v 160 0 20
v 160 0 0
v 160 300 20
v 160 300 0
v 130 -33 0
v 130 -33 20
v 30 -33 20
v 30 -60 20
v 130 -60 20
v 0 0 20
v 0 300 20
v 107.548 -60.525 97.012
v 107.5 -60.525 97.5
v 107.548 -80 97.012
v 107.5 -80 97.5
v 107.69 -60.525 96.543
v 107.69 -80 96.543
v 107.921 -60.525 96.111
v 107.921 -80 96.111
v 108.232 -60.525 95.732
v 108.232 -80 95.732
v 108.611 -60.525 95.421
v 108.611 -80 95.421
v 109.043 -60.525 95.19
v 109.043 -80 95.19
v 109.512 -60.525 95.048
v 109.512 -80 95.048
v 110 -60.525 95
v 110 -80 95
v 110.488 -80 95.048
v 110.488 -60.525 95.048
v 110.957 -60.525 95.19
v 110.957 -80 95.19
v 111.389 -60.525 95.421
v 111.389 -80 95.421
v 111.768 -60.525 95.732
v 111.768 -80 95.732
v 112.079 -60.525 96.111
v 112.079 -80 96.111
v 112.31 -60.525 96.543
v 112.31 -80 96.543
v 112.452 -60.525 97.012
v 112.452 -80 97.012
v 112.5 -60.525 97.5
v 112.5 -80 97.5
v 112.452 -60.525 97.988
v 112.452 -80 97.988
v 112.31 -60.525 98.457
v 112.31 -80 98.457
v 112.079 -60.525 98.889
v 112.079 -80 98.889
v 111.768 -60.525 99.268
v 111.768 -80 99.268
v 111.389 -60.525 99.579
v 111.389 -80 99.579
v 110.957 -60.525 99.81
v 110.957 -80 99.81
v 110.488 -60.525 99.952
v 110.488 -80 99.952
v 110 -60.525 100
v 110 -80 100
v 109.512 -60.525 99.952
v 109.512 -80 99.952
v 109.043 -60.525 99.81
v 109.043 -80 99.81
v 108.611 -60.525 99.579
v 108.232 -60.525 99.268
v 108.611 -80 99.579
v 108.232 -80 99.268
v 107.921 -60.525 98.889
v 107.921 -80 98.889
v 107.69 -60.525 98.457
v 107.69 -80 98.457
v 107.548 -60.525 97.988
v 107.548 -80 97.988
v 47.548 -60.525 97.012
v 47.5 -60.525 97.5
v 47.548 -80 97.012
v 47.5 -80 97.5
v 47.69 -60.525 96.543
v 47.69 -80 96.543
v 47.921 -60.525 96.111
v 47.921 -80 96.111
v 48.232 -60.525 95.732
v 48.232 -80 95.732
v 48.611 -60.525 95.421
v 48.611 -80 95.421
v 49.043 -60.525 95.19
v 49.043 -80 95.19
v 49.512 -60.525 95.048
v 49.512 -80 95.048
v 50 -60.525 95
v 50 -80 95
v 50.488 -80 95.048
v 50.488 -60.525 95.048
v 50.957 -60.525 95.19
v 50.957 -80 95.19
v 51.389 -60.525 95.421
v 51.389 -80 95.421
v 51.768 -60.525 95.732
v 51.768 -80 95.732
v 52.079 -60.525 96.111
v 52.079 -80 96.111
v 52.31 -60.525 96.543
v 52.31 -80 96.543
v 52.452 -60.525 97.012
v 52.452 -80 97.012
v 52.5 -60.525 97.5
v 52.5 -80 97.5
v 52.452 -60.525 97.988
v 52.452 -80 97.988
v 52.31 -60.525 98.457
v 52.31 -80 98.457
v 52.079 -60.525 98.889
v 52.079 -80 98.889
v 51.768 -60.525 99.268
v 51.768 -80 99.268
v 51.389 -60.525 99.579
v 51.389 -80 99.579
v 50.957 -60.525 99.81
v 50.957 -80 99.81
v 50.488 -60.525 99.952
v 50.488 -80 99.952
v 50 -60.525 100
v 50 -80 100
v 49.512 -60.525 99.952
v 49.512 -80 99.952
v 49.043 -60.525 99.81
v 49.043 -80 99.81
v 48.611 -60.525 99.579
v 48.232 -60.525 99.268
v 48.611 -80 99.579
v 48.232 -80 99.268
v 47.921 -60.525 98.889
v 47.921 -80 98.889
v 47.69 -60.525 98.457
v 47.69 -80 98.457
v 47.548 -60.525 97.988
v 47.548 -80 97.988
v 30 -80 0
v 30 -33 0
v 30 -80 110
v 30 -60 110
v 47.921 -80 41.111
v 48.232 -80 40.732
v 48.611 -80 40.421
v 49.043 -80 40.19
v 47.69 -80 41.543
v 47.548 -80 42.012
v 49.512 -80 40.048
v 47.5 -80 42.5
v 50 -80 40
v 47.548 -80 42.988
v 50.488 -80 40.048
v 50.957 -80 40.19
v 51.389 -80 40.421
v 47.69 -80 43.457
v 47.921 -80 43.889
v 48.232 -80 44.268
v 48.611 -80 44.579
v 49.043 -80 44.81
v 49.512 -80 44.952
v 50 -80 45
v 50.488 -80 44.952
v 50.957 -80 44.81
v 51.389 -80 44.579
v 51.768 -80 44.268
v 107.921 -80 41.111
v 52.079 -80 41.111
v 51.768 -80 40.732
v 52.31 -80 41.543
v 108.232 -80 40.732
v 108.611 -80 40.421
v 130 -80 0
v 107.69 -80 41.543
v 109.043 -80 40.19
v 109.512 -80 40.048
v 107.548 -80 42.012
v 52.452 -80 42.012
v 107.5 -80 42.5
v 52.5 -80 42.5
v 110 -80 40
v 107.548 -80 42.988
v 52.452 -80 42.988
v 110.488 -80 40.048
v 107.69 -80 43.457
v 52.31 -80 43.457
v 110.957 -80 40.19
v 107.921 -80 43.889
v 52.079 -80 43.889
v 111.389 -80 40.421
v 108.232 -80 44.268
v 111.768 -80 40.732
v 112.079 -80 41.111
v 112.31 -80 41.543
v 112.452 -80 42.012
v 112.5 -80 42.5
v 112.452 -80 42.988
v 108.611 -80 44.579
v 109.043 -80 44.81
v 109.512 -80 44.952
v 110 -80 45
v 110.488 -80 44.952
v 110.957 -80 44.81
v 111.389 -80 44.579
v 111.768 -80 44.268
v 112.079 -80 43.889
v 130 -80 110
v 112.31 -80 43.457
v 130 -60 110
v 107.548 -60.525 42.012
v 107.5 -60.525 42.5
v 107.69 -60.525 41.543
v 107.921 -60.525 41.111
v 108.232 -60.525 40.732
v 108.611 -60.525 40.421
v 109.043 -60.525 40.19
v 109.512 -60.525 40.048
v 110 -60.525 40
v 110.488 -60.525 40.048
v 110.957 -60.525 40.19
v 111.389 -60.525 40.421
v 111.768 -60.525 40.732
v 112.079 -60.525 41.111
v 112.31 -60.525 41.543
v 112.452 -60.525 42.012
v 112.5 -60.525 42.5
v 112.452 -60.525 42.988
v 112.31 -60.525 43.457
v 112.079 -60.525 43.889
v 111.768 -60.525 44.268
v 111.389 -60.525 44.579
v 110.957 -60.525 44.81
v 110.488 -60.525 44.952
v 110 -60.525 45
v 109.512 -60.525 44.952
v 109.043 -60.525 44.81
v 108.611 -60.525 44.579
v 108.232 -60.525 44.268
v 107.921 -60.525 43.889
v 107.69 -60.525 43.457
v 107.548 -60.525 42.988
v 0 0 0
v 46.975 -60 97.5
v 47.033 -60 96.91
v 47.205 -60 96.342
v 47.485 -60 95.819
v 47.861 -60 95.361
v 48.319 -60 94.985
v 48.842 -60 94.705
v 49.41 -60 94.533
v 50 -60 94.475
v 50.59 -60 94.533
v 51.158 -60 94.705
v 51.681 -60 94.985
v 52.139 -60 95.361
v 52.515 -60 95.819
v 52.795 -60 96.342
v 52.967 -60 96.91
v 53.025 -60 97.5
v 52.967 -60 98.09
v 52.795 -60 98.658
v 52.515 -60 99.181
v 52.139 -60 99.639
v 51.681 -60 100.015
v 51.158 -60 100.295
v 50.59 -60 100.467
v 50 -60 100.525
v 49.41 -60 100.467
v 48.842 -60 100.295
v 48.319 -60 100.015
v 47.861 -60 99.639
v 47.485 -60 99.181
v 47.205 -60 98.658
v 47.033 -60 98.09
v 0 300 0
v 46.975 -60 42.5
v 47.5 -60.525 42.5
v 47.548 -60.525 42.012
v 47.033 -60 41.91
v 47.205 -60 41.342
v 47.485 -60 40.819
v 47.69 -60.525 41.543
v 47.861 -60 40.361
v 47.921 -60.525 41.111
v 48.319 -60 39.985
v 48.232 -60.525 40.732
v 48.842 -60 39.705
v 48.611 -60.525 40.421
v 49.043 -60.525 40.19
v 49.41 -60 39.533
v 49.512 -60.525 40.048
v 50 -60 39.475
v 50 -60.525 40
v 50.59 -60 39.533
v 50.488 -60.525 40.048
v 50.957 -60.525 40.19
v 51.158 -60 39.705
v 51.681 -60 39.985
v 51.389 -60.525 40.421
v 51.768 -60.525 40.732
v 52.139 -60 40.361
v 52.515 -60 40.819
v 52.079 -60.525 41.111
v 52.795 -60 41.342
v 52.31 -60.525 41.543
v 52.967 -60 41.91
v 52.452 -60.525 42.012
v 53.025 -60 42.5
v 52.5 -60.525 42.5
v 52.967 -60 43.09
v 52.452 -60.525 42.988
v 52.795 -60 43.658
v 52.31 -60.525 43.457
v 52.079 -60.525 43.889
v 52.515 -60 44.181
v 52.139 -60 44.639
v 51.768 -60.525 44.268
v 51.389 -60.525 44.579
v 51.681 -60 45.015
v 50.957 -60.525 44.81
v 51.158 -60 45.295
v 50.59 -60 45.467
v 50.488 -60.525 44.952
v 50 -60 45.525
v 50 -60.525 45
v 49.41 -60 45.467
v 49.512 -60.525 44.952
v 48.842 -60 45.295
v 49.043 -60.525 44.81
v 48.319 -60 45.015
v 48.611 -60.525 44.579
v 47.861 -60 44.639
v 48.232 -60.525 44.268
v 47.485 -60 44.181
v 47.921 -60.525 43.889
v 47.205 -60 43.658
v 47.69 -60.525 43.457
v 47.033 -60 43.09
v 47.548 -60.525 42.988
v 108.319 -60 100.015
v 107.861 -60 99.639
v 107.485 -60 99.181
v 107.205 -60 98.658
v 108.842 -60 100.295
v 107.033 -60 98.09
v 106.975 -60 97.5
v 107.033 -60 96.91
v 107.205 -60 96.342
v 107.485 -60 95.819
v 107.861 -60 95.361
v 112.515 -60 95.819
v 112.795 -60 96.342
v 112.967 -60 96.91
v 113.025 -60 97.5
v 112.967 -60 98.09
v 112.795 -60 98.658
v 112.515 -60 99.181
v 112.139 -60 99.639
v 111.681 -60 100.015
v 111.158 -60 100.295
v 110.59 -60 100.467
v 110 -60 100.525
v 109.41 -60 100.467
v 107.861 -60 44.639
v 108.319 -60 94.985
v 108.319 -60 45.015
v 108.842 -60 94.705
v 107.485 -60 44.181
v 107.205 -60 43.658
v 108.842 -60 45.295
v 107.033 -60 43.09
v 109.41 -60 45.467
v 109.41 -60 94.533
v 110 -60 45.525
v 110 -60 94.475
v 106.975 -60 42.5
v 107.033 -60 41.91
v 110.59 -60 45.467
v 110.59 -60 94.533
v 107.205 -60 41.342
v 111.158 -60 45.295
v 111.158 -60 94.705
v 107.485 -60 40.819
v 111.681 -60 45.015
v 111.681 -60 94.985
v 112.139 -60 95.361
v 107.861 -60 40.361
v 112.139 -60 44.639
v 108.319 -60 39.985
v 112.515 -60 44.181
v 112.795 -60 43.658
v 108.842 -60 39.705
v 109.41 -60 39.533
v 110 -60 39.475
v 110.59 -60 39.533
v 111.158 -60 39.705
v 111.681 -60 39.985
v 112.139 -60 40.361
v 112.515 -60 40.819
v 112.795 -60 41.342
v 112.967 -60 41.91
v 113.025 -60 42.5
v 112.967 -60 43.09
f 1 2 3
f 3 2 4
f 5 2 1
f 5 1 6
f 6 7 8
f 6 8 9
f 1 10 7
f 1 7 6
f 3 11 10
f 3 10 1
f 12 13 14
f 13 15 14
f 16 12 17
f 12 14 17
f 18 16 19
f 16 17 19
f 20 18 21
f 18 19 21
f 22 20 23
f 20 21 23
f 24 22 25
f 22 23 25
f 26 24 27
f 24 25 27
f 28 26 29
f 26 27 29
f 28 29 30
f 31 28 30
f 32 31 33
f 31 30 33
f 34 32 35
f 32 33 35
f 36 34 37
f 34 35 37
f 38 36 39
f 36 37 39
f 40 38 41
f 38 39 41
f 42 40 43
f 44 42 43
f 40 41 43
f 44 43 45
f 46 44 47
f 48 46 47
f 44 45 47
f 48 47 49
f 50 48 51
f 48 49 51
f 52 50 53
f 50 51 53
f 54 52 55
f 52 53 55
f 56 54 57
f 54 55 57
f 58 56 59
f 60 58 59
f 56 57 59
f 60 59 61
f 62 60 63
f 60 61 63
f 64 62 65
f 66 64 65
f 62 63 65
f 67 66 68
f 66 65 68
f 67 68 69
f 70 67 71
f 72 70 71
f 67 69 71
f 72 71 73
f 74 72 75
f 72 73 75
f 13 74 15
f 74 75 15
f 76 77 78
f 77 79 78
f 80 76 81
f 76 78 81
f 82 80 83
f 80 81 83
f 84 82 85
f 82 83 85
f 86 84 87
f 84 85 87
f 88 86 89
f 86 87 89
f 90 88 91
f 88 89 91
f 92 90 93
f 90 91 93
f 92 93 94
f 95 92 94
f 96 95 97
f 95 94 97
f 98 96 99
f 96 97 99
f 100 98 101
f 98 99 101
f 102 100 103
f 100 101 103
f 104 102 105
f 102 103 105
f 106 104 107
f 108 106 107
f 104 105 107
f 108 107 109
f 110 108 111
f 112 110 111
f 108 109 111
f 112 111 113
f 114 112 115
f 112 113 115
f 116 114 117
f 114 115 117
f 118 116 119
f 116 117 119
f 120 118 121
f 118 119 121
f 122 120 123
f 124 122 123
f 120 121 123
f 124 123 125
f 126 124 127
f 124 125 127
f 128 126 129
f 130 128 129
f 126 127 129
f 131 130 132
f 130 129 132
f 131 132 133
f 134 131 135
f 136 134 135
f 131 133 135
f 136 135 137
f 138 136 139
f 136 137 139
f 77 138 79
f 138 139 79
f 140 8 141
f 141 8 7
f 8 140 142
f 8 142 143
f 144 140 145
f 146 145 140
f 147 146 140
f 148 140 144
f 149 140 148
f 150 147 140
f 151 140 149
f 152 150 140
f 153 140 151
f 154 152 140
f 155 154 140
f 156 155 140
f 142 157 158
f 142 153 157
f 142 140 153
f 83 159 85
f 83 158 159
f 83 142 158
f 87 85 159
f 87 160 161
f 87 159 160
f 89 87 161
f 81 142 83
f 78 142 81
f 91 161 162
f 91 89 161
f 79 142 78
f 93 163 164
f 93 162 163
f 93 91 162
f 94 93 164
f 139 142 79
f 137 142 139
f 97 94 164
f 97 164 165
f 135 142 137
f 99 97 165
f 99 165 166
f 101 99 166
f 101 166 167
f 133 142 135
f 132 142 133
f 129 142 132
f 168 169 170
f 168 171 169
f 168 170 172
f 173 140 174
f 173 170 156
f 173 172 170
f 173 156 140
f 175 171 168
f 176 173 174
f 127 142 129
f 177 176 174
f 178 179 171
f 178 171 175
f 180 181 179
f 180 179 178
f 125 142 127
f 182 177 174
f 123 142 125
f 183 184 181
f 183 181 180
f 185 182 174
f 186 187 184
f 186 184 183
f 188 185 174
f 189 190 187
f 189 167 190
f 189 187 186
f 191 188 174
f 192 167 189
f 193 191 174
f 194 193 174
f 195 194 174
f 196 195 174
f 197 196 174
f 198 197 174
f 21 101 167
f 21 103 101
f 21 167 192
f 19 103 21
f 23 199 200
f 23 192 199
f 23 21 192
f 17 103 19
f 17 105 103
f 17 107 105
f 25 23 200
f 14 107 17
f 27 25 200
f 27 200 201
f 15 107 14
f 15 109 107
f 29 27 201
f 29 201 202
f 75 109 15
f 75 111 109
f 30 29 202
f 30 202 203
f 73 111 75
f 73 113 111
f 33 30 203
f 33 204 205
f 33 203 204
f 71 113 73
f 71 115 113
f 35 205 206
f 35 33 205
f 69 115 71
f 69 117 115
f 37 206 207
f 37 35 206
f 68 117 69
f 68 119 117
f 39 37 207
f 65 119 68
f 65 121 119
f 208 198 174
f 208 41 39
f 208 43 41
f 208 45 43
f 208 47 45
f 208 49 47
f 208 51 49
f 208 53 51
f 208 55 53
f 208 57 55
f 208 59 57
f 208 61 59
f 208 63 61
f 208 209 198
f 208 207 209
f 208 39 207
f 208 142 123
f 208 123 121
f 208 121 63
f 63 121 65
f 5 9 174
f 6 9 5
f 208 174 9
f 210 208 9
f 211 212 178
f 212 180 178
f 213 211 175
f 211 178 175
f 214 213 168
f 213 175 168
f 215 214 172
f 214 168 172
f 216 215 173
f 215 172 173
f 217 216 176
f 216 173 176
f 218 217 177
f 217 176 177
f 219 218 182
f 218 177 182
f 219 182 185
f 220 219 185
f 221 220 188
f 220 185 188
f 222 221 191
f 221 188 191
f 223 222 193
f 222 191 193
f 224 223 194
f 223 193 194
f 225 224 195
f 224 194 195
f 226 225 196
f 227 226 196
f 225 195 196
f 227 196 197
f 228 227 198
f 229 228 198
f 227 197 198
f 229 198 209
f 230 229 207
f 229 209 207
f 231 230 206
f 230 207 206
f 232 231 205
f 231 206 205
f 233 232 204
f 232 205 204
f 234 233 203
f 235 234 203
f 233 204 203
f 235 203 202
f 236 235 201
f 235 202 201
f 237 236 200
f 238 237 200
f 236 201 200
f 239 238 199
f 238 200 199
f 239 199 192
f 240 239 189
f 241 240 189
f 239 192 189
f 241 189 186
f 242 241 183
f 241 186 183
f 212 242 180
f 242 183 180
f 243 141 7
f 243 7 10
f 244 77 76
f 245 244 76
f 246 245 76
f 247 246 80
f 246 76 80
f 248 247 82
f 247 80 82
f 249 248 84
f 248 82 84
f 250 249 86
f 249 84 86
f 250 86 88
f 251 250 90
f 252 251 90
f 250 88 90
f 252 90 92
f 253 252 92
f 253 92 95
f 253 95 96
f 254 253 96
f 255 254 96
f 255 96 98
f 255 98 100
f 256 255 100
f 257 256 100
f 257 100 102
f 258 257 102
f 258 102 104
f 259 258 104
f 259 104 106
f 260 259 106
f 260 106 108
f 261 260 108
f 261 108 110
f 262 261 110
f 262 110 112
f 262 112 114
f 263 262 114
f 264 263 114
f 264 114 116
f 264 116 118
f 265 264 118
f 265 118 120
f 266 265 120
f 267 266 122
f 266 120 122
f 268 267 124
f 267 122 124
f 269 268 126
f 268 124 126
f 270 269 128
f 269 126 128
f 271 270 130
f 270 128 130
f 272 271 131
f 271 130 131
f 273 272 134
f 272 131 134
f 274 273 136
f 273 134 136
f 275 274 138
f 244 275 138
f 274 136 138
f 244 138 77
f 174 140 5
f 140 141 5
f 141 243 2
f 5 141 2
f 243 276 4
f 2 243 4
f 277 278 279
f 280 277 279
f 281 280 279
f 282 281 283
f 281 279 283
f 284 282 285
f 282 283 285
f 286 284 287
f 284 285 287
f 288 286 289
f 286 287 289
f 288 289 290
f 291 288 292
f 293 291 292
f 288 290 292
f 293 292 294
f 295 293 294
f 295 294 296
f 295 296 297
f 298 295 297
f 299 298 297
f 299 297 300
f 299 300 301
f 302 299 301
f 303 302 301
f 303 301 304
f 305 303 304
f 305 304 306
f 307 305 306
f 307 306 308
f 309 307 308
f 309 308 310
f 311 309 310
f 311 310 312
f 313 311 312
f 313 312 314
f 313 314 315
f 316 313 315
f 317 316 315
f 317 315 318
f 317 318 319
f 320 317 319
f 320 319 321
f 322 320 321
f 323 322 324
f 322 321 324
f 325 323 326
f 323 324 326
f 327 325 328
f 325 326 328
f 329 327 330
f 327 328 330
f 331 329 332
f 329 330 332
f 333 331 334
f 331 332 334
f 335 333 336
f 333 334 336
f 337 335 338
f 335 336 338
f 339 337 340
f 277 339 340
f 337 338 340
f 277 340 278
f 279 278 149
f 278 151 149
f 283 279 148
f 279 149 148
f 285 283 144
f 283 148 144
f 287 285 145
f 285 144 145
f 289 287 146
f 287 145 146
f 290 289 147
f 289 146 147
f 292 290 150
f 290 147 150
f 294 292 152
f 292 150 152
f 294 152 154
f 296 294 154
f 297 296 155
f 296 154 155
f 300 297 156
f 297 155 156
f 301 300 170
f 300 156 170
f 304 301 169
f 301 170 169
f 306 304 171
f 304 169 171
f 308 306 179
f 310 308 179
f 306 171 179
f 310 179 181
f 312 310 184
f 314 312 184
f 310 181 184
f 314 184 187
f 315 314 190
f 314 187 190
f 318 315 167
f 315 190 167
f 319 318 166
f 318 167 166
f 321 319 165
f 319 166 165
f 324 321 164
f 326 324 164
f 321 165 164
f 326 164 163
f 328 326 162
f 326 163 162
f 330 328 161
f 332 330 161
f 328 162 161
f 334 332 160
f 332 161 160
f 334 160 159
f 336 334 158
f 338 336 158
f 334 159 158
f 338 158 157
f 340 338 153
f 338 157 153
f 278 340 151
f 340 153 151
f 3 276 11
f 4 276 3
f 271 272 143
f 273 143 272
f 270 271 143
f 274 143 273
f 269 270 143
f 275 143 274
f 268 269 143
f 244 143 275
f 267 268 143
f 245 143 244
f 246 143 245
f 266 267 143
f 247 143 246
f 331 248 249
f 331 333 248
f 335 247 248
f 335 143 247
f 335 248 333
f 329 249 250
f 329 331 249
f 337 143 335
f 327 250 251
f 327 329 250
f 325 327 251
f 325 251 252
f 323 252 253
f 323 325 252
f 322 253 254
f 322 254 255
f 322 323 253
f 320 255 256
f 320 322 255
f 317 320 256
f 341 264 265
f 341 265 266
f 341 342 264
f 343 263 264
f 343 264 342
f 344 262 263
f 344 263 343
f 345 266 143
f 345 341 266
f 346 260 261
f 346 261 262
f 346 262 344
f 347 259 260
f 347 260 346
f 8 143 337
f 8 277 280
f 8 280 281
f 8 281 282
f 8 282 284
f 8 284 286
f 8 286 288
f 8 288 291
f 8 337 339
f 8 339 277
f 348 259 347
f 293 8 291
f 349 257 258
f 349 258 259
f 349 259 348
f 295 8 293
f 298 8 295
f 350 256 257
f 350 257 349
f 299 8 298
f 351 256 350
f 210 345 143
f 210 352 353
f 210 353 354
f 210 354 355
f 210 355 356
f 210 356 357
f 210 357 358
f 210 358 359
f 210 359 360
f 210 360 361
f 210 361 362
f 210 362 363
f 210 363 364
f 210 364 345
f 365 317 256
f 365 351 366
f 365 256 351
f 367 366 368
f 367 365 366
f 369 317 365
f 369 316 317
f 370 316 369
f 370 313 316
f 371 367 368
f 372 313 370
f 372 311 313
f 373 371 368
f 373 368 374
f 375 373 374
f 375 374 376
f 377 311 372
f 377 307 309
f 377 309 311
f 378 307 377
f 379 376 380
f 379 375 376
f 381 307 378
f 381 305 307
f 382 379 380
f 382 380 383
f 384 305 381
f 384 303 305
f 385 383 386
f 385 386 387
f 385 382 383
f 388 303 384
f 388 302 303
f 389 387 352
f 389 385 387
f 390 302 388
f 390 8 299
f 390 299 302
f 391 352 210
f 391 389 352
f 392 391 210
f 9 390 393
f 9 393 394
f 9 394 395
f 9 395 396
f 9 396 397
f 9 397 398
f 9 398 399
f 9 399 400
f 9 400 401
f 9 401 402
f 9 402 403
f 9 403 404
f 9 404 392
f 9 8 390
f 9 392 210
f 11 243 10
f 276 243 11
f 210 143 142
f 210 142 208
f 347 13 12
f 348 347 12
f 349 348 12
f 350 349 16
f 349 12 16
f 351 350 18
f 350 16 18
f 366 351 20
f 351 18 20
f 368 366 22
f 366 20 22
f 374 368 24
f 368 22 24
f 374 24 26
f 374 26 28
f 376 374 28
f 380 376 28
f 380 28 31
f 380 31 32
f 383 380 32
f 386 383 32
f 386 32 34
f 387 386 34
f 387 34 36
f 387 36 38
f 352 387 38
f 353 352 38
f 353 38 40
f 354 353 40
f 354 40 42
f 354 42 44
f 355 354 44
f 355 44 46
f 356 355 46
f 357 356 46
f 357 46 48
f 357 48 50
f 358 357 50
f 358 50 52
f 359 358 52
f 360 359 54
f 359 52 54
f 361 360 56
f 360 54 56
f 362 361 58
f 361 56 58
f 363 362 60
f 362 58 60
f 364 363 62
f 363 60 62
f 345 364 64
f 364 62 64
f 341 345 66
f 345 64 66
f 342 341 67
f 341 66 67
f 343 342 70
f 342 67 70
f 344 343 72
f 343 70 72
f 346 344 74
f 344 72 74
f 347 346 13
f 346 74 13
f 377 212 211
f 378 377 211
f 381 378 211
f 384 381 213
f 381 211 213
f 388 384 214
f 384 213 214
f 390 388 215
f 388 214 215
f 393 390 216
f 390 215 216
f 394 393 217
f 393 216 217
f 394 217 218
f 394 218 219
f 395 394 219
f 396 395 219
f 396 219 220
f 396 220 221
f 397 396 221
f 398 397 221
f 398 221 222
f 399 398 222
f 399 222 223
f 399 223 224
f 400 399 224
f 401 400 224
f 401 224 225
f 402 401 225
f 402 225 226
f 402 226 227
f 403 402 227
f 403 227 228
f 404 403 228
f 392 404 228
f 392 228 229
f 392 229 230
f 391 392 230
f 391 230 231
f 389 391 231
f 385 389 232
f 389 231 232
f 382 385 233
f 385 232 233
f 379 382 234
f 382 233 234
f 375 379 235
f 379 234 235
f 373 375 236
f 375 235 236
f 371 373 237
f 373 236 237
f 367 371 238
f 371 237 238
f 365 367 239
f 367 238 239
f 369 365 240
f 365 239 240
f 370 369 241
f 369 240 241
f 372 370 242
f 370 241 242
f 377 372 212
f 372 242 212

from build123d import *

# Parameters (mm, degrees)
SKIZZE1_W                            = 160
SKIZZE1_H                            = 300
SKIZZE1_W_2                          = 100
SKIZZE1_H_2                          = 27
AUFSATZ_LINEAR_AUSTRAGEN1_DEPTH      = 20
SKIZZE2_W                            = 100
SKIZZE2_H                            = 20
AUFSATZ_LINEAR_AUSTRAGEN2_DEPTH      = 90
AUFSATZ_LINEAR_AUSTRAGEN2_DEPTH_BACK = 20
M6_GEWINDEBOHRUNG1_D                 = 5
M6_GEWINDEBOHRUNG1_CSINK_D           = 6.05
M6_GEWINDEBOHRUNG1_CSINK_ANGLE       = 90


with BuildPart() as part:
    # Skizze1 → Aufsatz-Linear austragen1 (new body)
    with BuildSketch(Plane.XY):
        with Locations((80, 150)):
            Rectangle(SKIZZE1_W, SKIZZE1_H)
        Polygon((0, 0), (160, 0), (130, -33), (30, -33), align=None)
        with Locations((80, -46.5)):
            Rectangle(SKIZZE1_W_2, SKIZZE1_H_2)
    extrude(amount=AUFSATZ_LINEAR_AUSTRAGEN1_DEPTH)

    # Skizze2 → Aufsatz-Linear austragen2 (add, two sides)
    with BuildSketch(Plane.XY.offset(20)) as aufsatz_linear_austragen2_sk:
        with Locations((80, -70)):
            Rectangle(SKIZZE2_W, SKIZZE2_H)
    extrude(amount=AUFSATZ_LINEAR_AUSTRAGEN2_DEPTH)
    extrude(aufsatz_linear_austragen2_sk.sketch, amount=-AUFSATZ_LINEAR_AUSTRAGEN2_DEPTH_BACK)

    # M6 Gewindebohrung1 (through all)
    with Locations(Plane(origin=(0, -60, 0), x_dir=(1, 0, 0), z_dir=(0, 1, 0))):
        with Locations((50, -97.5), (110, -97.5), (110, -42.5), (50, -42.5)):
            CounterSinkHole(M6_GEWINDEBOHRUNG1_D / 2, M6_GEWINDEBOHRUNG1_CSINK_D / 2, counter_sink_angle=M6_GEWINDEBOHRUNG1_CSINK_ANGLE)


solid = part.part
